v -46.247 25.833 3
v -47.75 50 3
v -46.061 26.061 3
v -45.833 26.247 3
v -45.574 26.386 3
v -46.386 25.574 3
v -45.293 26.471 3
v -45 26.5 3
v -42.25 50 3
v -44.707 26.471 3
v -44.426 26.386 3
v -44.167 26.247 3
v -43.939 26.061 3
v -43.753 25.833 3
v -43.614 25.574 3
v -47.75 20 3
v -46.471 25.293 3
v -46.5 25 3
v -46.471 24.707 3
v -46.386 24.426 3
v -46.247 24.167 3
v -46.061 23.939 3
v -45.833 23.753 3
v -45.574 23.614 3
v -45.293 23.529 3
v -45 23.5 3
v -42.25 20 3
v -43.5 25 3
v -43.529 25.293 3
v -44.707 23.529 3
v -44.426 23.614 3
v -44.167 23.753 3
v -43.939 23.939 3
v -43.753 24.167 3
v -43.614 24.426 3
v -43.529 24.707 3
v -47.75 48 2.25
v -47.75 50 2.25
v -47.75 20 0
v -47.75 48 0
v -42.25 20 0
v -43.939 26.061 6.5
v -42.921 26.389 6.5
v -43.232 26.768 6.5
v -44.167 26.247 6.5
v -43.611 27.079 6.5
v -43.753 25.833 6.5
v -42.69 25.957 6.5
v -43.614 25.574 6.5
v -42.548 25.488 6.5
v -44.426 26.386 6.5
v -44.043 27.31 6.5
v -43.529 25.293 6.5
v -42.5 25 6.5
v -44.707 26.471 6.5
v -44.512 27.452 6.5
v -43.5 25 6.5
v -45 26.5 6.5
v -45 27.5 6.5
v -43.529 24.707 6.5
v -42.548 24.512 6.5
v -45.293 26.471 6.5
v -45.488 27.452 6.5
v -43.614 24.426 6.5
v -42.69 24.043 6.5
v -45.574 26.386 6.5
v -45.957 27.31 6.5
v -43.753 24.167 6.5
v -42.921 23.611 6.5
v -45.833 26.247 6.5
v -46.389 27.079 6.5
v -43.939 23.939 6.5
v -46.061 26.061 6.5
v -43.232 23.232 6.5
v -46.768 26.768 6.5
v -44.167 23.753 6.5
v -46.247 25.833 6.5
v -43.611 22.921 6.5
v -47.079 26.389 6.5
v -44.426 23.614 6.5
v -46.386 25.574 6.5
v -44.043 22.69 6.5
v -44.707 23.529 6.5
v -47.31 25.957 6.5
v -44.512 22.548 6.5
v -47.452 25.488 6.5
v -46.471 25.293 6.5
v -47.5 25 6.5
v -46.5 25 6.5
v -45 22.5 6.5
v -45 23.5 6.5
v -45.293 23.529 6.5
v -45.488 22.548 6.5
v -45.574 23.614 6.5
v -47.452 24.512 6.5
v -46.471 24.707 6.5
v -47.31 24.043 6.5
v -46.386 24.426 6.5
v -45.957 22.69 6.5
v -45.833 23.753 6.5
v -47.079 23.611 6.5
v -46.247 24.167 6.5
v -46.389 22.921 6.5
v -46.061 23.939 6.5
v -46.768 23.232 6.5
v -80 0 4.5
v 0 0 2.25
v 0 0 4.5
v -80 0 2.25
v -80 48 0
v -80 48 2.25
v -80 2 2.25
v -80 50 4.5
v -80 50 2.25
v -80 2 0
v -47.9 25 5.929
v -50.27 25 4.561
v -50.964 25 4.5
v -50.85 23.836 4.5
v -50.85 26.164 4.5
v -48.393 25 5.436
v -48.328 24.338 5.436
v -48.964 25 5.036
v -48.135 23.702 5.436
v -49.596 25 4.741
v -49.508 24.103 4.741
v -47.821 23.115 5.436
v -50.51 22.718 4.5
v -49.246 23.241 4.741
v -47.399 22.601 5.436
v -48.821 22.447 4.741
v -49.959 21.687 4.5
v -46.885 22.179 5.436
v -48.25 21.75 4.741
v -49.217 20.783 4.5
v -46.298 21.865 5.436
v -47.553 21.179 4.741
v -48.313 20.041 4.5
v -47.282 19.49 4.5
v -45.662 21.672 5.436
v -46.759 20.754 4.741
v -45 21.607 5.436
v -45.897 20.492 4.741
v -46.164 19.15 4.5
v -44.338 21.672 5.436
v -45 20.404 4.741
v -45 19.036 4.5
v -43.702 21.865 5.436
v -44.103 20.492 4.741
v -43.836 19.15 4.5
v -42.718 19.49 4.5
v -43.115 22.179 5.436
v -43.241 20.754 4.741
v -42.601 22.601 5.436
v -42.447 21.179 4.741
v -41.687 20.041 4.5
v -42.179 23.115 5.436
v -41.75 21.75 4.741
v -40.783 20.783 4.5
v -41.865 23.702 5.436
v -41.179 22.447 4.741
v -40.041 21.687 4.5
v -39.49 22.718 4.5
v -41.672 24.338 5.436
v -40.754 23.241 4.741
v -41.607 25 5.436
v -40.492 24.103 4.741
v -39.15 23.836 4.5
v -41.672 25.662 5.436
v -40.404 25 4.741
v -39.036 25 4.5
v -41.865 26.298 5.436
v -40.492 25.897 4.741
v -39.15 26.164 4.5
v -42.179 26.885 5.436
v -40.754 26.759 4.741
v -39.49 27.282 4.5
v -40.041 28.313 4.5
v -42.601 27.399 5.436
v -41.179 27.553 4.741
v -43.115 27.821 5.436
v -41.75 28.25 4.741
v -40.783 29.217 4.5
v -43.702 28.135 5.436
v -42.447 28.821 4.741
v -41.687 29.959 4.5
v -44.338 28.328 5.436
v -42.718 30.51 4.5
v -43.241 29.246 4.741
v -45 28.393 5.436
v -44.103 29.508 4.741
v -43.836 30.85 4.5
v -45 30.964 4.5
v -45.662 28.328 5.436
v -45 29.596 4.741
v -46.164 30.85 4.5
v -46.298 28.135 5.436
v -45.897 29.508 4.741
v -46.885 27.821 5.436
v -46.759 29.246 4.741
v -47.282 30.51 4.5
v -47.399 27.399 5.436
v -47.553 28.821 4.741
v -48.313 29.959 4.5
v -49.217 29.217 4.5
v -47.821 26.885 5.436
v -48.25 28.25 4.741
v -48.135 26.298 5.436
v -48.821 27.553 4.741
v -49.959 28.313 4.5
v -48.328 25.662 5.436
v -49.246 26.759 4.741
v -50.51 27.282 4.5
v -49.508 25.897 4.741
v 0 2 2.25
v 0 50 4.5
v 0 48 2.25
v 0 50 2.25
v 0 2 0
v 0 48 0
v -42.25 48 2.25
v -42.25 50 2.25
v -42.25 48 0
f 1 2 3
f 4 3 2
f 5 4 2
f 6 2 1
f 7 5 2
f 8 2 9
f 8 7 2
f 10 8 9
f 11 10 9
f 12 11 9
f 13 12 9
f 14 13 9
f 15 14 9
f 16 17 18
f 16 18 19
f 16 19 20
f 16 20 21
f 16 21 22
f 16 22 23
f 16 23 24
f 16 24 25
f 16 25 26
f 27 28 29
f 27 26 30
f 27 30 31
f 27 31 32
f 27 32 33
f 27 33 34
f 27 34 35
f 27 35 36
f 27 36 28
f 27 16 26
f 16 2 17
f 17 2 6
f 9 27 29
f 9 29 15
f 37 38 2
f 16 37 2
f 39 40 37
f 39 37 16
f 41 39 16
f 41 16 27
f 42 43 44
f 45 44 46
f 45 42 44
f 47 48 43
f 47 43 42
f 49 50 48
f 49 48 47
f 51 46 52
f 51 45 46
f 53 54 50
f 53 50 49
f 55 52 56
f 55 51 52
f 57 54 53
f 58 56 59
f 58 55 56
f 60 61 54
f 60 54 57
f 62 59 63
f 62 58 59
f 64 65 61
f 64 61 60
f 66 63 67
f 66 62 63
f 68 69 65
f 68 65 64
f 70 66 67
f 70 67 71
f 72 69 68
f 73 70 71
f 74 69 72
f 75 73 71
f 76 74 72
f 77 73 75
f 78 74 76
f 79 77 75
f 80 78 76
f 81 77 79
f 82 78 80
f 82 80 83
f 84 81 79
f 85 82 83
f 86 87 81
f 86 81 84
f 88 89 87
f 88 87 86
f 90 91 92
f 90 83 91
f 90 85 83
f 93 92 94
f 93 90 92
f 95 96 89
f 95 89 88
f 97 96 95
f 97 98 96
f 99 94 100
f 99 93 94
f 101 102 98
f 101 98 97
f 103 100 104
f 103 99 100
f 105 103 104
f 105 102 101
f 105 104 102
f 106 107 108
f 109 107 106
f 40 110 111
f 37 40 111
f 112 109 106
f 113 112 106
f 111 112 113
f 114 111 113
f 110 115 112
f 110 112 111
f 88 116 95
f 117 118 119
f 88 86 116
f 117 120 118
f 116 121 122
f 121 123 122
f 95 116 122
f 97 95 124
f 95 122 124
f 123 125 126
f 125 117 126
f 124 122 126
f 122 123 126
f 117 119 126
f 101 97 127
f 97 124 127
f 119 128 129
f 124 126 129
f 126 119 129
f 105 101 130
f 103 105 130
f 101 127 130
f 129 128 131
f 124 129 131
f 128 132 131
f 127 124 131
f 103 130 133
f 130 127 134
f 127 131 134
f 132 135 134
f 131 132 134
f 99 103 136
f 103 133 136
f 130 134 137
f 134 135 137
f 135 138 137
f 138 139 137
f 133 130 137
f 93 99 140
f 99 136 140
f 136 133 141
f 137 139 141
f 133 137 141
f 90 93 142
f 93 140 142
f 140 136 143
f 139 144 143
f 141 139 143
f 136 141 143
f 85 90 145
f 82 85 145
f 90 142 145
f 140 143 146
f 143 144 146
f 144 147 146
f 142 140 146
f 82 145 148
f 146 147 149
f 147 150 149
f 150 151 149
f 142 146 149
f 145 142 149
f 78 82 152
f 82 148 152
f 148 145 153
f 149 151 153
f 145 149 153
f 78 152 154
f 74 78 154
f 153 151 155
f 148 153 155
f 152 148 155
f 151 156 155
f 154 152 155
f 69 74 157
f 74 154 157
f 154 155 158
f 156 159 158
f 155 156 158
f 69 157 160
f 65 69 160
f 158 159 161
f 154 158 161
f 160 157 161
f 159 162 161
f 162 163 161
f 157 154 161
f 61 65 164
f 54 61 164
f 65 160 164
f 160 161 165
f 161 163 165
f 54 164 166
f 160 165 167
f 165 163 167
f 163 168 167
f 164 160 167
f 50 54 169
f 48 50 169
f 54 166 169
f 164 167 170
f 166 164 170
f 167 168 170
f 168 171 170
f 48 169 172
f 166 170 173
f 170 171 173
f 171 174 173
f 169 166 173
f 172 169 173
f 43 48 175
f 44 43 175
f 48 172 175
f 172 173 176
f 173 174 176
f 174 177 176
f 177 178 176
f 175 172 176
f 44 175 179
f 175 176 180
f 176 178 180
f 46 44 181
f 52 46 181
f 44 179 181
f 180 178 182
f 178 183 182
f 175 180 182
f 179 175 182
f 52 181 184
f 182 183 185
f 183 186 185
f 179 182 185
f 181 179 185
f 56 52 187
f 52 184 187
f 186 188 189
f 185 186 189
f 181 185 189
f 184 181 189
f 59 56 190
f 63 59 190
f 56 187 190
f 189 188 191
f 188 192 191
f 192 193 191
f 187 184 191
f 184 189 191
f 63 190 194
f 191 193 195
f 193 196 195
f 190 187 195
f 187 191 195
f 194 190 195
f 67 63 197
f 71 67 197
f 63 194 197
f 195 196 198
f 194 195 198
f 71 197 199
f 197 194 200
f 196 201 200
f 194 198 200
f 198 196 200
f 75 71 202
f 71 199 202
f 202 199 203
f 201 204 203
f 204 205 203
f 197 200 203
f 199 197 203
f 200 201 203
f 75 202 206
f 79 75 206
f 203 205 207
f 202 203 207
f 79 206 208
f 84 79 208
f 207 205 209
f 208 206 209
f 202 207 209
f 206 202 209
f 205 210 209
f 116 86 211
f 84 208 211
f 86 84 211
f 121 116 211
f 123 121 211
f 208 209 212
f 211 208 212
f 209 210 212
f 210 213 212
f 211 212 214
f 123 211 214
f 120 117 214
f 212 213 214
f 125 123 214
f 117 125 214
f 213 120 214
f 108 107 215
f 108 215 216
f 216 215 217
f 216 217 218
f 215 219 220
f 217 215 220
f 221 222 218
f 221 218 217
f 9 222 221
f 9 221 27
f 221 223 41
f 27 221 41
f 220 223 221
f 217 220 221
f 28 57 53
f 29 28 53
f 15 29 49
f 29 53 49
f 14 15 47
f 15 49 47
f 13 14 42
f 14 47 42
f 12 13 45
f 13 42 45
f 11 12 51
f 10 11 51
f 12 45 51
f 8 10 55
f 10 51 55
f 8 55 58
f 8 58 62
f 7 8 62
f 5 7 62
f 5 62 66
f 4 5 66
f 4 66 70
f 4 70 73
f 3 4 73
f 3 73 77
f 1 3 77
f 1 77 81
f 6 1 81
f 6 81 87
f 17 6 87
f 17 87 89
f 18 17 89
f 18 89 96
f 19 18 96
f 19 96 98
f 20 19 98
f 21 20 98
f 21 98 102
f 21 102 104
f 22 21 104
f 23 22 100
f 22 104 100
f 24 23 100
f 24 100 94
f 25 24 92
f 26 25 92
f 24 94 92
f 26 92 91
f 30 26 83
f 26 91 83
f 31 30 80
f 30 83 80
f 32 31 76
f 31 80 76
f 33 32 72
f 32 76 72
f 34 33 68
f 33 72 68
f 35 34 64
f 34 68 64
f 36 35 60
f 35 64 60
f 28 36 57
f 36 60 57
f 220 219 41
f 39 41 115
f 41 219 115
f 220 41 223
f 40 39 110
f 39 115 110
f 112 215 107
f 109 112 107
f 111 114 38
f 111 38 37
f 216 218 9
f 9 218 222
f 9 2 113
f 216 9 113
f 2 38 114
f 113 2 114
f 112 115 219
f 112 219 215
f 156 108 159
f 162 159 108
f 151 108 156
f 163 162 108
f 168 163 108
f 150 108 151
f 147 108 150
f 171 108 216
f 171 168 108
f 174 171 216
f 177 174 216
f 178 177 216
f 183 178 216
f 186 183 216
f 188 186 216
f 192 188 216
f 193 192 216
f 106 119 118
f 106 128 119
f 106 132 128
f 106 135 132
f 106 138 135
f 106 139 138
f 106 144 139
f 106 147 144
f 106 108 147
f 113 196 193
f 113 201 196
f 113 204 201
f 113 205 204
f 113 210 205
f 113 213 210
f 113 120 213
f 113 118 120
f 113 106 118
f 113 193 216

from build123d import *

# Parameters (mm, degrees)
SKETCH1_W           = 50
SKETCH1_H           = 80
BOSS_EXTRUDE1_DEPTH = 4.5
SKETCH2_R           = 0.5
CUT_EXTRUDE1_DEPTH  = 95.447075127
SKETCH3_W           = 2
SKETCH3_H           = 2.25
CUT_EXTRUDE2_DEPTH  = 95.447075127
SKETCH5_R           = 2.5
BOSS_EXTRUDE2_DEPTH = 2
SKETCH6_R           = 1.5
CUT_EXTRUDE3_DEPTH  = 95.563470748
FILLET1_R           = 4
SKETCH8_W           = 5.5
SKETCH8_H           = 30
CUT_EXTRUDE4_DEPTH  = 3


with BuildPart() as part:
    # Sketch1 → Boss-Extrude1 (new body)
    with BuildSketch(Plane(origin=(0, 0, 0), x_dir=(0, 1, 0), z_dir=(0, 0, 1))):
        with Locations((25, 40)):
            Rectangle(SKETCH1_W, SKETCH1_H)
    extrude(amount=BOSS_EXTRUDE1_DEPTH)

    # Sketch2 → Cut-Extrude1 (cut, through all)
    with BuildSketch(Plane.XY.offset(4.5)):
        with Locations((-45, 25)):
            Circle(SKETCH2_R)
    extrude(amount=-CUT_EXTRUDE1_DEPTH, mode=Mode.SUBTRACT)

    # Sketch3 → Cut-Extrude2 (cut, through all)
    with BuildSketch(Plane(origin=(-80, 0, 0), x_dir=(0, -1, 0), z_dir=(-1, 0, 0))):
        with Locations((-49, 1.125)):
            Rectangle(SKETCH3_W, SKETCH3_H)
        with Locations((-1, 1.125)):
            Rectangle(SKETCH3_W, SKETCH3_H)
    extrude(amount=-CUT_EXTRUDE2_DEPTH, mode=Mode.SUBTRACT)

    # Sketch5 → Boss-Extrude2 (add)
    with BuildSketch(Plane.XY.offset(4.5)):
        with Locations(Location((-45, 25, 0), (0, 0, 180))):
            Circle(SKETCH5_R)
    extrude(amount=BOSS_EXTRUDE2_DEPTH)

    # Sketch6 → Cut-Extrude3 (cut, through all)
    with BuildSketch(Plane.XY.offset(6.5)):
        with Locations((-45, 25)):
            Circle(SKETCH6_R)
    extrude(amount=-CUT_EXTRUDE3_DEPTH, mode=Mode.SUBTRACT)

    # Fillet1
    # the kernel refuses this fillet: 4 mm, written as the material it adds along each edge
    with BuildSketch(Plane(origin=(-45, 25, 4.5), x_dir=(-1, 0, 0), z_dir=(0, 1, 0))) as fillet1_piece_1:
        with BuildLine():
            CenterArc((5.964101615, 4), FILLET1_R, 210, 60)
            Line((2.5, 2), (2.430717968, 1.96))
            ThreePointArc((2.430717968, 1.96), (2.42, 1), (2.42, 0))
            Line((2.42, 0), (2.5, -0.08))
            Line((2.5, -0.08), (5.964101615, -0.08))
            Line((5.964101615, -0.08), (5.964101615, 0))
        make_face()
    revolve(axis=Axis((-45, 25, 4.5), (0, 0, 1)))

    # Sketch8 → Cut-Extrude4 (cut)
    with BuildSketch(Plane(origin=(0, 0, 0), x_dir=(1, 0, 0), z_dir=(0, 0, -1))):
        with Locations((-45, -35)):
            Rectangle(SKETCH8_W, SKETCH8_H)
    extrude(amount=-CUT_EXTRUDE4_DEPTH, mode=Mode.SUBTRACT)


solid = part.part
